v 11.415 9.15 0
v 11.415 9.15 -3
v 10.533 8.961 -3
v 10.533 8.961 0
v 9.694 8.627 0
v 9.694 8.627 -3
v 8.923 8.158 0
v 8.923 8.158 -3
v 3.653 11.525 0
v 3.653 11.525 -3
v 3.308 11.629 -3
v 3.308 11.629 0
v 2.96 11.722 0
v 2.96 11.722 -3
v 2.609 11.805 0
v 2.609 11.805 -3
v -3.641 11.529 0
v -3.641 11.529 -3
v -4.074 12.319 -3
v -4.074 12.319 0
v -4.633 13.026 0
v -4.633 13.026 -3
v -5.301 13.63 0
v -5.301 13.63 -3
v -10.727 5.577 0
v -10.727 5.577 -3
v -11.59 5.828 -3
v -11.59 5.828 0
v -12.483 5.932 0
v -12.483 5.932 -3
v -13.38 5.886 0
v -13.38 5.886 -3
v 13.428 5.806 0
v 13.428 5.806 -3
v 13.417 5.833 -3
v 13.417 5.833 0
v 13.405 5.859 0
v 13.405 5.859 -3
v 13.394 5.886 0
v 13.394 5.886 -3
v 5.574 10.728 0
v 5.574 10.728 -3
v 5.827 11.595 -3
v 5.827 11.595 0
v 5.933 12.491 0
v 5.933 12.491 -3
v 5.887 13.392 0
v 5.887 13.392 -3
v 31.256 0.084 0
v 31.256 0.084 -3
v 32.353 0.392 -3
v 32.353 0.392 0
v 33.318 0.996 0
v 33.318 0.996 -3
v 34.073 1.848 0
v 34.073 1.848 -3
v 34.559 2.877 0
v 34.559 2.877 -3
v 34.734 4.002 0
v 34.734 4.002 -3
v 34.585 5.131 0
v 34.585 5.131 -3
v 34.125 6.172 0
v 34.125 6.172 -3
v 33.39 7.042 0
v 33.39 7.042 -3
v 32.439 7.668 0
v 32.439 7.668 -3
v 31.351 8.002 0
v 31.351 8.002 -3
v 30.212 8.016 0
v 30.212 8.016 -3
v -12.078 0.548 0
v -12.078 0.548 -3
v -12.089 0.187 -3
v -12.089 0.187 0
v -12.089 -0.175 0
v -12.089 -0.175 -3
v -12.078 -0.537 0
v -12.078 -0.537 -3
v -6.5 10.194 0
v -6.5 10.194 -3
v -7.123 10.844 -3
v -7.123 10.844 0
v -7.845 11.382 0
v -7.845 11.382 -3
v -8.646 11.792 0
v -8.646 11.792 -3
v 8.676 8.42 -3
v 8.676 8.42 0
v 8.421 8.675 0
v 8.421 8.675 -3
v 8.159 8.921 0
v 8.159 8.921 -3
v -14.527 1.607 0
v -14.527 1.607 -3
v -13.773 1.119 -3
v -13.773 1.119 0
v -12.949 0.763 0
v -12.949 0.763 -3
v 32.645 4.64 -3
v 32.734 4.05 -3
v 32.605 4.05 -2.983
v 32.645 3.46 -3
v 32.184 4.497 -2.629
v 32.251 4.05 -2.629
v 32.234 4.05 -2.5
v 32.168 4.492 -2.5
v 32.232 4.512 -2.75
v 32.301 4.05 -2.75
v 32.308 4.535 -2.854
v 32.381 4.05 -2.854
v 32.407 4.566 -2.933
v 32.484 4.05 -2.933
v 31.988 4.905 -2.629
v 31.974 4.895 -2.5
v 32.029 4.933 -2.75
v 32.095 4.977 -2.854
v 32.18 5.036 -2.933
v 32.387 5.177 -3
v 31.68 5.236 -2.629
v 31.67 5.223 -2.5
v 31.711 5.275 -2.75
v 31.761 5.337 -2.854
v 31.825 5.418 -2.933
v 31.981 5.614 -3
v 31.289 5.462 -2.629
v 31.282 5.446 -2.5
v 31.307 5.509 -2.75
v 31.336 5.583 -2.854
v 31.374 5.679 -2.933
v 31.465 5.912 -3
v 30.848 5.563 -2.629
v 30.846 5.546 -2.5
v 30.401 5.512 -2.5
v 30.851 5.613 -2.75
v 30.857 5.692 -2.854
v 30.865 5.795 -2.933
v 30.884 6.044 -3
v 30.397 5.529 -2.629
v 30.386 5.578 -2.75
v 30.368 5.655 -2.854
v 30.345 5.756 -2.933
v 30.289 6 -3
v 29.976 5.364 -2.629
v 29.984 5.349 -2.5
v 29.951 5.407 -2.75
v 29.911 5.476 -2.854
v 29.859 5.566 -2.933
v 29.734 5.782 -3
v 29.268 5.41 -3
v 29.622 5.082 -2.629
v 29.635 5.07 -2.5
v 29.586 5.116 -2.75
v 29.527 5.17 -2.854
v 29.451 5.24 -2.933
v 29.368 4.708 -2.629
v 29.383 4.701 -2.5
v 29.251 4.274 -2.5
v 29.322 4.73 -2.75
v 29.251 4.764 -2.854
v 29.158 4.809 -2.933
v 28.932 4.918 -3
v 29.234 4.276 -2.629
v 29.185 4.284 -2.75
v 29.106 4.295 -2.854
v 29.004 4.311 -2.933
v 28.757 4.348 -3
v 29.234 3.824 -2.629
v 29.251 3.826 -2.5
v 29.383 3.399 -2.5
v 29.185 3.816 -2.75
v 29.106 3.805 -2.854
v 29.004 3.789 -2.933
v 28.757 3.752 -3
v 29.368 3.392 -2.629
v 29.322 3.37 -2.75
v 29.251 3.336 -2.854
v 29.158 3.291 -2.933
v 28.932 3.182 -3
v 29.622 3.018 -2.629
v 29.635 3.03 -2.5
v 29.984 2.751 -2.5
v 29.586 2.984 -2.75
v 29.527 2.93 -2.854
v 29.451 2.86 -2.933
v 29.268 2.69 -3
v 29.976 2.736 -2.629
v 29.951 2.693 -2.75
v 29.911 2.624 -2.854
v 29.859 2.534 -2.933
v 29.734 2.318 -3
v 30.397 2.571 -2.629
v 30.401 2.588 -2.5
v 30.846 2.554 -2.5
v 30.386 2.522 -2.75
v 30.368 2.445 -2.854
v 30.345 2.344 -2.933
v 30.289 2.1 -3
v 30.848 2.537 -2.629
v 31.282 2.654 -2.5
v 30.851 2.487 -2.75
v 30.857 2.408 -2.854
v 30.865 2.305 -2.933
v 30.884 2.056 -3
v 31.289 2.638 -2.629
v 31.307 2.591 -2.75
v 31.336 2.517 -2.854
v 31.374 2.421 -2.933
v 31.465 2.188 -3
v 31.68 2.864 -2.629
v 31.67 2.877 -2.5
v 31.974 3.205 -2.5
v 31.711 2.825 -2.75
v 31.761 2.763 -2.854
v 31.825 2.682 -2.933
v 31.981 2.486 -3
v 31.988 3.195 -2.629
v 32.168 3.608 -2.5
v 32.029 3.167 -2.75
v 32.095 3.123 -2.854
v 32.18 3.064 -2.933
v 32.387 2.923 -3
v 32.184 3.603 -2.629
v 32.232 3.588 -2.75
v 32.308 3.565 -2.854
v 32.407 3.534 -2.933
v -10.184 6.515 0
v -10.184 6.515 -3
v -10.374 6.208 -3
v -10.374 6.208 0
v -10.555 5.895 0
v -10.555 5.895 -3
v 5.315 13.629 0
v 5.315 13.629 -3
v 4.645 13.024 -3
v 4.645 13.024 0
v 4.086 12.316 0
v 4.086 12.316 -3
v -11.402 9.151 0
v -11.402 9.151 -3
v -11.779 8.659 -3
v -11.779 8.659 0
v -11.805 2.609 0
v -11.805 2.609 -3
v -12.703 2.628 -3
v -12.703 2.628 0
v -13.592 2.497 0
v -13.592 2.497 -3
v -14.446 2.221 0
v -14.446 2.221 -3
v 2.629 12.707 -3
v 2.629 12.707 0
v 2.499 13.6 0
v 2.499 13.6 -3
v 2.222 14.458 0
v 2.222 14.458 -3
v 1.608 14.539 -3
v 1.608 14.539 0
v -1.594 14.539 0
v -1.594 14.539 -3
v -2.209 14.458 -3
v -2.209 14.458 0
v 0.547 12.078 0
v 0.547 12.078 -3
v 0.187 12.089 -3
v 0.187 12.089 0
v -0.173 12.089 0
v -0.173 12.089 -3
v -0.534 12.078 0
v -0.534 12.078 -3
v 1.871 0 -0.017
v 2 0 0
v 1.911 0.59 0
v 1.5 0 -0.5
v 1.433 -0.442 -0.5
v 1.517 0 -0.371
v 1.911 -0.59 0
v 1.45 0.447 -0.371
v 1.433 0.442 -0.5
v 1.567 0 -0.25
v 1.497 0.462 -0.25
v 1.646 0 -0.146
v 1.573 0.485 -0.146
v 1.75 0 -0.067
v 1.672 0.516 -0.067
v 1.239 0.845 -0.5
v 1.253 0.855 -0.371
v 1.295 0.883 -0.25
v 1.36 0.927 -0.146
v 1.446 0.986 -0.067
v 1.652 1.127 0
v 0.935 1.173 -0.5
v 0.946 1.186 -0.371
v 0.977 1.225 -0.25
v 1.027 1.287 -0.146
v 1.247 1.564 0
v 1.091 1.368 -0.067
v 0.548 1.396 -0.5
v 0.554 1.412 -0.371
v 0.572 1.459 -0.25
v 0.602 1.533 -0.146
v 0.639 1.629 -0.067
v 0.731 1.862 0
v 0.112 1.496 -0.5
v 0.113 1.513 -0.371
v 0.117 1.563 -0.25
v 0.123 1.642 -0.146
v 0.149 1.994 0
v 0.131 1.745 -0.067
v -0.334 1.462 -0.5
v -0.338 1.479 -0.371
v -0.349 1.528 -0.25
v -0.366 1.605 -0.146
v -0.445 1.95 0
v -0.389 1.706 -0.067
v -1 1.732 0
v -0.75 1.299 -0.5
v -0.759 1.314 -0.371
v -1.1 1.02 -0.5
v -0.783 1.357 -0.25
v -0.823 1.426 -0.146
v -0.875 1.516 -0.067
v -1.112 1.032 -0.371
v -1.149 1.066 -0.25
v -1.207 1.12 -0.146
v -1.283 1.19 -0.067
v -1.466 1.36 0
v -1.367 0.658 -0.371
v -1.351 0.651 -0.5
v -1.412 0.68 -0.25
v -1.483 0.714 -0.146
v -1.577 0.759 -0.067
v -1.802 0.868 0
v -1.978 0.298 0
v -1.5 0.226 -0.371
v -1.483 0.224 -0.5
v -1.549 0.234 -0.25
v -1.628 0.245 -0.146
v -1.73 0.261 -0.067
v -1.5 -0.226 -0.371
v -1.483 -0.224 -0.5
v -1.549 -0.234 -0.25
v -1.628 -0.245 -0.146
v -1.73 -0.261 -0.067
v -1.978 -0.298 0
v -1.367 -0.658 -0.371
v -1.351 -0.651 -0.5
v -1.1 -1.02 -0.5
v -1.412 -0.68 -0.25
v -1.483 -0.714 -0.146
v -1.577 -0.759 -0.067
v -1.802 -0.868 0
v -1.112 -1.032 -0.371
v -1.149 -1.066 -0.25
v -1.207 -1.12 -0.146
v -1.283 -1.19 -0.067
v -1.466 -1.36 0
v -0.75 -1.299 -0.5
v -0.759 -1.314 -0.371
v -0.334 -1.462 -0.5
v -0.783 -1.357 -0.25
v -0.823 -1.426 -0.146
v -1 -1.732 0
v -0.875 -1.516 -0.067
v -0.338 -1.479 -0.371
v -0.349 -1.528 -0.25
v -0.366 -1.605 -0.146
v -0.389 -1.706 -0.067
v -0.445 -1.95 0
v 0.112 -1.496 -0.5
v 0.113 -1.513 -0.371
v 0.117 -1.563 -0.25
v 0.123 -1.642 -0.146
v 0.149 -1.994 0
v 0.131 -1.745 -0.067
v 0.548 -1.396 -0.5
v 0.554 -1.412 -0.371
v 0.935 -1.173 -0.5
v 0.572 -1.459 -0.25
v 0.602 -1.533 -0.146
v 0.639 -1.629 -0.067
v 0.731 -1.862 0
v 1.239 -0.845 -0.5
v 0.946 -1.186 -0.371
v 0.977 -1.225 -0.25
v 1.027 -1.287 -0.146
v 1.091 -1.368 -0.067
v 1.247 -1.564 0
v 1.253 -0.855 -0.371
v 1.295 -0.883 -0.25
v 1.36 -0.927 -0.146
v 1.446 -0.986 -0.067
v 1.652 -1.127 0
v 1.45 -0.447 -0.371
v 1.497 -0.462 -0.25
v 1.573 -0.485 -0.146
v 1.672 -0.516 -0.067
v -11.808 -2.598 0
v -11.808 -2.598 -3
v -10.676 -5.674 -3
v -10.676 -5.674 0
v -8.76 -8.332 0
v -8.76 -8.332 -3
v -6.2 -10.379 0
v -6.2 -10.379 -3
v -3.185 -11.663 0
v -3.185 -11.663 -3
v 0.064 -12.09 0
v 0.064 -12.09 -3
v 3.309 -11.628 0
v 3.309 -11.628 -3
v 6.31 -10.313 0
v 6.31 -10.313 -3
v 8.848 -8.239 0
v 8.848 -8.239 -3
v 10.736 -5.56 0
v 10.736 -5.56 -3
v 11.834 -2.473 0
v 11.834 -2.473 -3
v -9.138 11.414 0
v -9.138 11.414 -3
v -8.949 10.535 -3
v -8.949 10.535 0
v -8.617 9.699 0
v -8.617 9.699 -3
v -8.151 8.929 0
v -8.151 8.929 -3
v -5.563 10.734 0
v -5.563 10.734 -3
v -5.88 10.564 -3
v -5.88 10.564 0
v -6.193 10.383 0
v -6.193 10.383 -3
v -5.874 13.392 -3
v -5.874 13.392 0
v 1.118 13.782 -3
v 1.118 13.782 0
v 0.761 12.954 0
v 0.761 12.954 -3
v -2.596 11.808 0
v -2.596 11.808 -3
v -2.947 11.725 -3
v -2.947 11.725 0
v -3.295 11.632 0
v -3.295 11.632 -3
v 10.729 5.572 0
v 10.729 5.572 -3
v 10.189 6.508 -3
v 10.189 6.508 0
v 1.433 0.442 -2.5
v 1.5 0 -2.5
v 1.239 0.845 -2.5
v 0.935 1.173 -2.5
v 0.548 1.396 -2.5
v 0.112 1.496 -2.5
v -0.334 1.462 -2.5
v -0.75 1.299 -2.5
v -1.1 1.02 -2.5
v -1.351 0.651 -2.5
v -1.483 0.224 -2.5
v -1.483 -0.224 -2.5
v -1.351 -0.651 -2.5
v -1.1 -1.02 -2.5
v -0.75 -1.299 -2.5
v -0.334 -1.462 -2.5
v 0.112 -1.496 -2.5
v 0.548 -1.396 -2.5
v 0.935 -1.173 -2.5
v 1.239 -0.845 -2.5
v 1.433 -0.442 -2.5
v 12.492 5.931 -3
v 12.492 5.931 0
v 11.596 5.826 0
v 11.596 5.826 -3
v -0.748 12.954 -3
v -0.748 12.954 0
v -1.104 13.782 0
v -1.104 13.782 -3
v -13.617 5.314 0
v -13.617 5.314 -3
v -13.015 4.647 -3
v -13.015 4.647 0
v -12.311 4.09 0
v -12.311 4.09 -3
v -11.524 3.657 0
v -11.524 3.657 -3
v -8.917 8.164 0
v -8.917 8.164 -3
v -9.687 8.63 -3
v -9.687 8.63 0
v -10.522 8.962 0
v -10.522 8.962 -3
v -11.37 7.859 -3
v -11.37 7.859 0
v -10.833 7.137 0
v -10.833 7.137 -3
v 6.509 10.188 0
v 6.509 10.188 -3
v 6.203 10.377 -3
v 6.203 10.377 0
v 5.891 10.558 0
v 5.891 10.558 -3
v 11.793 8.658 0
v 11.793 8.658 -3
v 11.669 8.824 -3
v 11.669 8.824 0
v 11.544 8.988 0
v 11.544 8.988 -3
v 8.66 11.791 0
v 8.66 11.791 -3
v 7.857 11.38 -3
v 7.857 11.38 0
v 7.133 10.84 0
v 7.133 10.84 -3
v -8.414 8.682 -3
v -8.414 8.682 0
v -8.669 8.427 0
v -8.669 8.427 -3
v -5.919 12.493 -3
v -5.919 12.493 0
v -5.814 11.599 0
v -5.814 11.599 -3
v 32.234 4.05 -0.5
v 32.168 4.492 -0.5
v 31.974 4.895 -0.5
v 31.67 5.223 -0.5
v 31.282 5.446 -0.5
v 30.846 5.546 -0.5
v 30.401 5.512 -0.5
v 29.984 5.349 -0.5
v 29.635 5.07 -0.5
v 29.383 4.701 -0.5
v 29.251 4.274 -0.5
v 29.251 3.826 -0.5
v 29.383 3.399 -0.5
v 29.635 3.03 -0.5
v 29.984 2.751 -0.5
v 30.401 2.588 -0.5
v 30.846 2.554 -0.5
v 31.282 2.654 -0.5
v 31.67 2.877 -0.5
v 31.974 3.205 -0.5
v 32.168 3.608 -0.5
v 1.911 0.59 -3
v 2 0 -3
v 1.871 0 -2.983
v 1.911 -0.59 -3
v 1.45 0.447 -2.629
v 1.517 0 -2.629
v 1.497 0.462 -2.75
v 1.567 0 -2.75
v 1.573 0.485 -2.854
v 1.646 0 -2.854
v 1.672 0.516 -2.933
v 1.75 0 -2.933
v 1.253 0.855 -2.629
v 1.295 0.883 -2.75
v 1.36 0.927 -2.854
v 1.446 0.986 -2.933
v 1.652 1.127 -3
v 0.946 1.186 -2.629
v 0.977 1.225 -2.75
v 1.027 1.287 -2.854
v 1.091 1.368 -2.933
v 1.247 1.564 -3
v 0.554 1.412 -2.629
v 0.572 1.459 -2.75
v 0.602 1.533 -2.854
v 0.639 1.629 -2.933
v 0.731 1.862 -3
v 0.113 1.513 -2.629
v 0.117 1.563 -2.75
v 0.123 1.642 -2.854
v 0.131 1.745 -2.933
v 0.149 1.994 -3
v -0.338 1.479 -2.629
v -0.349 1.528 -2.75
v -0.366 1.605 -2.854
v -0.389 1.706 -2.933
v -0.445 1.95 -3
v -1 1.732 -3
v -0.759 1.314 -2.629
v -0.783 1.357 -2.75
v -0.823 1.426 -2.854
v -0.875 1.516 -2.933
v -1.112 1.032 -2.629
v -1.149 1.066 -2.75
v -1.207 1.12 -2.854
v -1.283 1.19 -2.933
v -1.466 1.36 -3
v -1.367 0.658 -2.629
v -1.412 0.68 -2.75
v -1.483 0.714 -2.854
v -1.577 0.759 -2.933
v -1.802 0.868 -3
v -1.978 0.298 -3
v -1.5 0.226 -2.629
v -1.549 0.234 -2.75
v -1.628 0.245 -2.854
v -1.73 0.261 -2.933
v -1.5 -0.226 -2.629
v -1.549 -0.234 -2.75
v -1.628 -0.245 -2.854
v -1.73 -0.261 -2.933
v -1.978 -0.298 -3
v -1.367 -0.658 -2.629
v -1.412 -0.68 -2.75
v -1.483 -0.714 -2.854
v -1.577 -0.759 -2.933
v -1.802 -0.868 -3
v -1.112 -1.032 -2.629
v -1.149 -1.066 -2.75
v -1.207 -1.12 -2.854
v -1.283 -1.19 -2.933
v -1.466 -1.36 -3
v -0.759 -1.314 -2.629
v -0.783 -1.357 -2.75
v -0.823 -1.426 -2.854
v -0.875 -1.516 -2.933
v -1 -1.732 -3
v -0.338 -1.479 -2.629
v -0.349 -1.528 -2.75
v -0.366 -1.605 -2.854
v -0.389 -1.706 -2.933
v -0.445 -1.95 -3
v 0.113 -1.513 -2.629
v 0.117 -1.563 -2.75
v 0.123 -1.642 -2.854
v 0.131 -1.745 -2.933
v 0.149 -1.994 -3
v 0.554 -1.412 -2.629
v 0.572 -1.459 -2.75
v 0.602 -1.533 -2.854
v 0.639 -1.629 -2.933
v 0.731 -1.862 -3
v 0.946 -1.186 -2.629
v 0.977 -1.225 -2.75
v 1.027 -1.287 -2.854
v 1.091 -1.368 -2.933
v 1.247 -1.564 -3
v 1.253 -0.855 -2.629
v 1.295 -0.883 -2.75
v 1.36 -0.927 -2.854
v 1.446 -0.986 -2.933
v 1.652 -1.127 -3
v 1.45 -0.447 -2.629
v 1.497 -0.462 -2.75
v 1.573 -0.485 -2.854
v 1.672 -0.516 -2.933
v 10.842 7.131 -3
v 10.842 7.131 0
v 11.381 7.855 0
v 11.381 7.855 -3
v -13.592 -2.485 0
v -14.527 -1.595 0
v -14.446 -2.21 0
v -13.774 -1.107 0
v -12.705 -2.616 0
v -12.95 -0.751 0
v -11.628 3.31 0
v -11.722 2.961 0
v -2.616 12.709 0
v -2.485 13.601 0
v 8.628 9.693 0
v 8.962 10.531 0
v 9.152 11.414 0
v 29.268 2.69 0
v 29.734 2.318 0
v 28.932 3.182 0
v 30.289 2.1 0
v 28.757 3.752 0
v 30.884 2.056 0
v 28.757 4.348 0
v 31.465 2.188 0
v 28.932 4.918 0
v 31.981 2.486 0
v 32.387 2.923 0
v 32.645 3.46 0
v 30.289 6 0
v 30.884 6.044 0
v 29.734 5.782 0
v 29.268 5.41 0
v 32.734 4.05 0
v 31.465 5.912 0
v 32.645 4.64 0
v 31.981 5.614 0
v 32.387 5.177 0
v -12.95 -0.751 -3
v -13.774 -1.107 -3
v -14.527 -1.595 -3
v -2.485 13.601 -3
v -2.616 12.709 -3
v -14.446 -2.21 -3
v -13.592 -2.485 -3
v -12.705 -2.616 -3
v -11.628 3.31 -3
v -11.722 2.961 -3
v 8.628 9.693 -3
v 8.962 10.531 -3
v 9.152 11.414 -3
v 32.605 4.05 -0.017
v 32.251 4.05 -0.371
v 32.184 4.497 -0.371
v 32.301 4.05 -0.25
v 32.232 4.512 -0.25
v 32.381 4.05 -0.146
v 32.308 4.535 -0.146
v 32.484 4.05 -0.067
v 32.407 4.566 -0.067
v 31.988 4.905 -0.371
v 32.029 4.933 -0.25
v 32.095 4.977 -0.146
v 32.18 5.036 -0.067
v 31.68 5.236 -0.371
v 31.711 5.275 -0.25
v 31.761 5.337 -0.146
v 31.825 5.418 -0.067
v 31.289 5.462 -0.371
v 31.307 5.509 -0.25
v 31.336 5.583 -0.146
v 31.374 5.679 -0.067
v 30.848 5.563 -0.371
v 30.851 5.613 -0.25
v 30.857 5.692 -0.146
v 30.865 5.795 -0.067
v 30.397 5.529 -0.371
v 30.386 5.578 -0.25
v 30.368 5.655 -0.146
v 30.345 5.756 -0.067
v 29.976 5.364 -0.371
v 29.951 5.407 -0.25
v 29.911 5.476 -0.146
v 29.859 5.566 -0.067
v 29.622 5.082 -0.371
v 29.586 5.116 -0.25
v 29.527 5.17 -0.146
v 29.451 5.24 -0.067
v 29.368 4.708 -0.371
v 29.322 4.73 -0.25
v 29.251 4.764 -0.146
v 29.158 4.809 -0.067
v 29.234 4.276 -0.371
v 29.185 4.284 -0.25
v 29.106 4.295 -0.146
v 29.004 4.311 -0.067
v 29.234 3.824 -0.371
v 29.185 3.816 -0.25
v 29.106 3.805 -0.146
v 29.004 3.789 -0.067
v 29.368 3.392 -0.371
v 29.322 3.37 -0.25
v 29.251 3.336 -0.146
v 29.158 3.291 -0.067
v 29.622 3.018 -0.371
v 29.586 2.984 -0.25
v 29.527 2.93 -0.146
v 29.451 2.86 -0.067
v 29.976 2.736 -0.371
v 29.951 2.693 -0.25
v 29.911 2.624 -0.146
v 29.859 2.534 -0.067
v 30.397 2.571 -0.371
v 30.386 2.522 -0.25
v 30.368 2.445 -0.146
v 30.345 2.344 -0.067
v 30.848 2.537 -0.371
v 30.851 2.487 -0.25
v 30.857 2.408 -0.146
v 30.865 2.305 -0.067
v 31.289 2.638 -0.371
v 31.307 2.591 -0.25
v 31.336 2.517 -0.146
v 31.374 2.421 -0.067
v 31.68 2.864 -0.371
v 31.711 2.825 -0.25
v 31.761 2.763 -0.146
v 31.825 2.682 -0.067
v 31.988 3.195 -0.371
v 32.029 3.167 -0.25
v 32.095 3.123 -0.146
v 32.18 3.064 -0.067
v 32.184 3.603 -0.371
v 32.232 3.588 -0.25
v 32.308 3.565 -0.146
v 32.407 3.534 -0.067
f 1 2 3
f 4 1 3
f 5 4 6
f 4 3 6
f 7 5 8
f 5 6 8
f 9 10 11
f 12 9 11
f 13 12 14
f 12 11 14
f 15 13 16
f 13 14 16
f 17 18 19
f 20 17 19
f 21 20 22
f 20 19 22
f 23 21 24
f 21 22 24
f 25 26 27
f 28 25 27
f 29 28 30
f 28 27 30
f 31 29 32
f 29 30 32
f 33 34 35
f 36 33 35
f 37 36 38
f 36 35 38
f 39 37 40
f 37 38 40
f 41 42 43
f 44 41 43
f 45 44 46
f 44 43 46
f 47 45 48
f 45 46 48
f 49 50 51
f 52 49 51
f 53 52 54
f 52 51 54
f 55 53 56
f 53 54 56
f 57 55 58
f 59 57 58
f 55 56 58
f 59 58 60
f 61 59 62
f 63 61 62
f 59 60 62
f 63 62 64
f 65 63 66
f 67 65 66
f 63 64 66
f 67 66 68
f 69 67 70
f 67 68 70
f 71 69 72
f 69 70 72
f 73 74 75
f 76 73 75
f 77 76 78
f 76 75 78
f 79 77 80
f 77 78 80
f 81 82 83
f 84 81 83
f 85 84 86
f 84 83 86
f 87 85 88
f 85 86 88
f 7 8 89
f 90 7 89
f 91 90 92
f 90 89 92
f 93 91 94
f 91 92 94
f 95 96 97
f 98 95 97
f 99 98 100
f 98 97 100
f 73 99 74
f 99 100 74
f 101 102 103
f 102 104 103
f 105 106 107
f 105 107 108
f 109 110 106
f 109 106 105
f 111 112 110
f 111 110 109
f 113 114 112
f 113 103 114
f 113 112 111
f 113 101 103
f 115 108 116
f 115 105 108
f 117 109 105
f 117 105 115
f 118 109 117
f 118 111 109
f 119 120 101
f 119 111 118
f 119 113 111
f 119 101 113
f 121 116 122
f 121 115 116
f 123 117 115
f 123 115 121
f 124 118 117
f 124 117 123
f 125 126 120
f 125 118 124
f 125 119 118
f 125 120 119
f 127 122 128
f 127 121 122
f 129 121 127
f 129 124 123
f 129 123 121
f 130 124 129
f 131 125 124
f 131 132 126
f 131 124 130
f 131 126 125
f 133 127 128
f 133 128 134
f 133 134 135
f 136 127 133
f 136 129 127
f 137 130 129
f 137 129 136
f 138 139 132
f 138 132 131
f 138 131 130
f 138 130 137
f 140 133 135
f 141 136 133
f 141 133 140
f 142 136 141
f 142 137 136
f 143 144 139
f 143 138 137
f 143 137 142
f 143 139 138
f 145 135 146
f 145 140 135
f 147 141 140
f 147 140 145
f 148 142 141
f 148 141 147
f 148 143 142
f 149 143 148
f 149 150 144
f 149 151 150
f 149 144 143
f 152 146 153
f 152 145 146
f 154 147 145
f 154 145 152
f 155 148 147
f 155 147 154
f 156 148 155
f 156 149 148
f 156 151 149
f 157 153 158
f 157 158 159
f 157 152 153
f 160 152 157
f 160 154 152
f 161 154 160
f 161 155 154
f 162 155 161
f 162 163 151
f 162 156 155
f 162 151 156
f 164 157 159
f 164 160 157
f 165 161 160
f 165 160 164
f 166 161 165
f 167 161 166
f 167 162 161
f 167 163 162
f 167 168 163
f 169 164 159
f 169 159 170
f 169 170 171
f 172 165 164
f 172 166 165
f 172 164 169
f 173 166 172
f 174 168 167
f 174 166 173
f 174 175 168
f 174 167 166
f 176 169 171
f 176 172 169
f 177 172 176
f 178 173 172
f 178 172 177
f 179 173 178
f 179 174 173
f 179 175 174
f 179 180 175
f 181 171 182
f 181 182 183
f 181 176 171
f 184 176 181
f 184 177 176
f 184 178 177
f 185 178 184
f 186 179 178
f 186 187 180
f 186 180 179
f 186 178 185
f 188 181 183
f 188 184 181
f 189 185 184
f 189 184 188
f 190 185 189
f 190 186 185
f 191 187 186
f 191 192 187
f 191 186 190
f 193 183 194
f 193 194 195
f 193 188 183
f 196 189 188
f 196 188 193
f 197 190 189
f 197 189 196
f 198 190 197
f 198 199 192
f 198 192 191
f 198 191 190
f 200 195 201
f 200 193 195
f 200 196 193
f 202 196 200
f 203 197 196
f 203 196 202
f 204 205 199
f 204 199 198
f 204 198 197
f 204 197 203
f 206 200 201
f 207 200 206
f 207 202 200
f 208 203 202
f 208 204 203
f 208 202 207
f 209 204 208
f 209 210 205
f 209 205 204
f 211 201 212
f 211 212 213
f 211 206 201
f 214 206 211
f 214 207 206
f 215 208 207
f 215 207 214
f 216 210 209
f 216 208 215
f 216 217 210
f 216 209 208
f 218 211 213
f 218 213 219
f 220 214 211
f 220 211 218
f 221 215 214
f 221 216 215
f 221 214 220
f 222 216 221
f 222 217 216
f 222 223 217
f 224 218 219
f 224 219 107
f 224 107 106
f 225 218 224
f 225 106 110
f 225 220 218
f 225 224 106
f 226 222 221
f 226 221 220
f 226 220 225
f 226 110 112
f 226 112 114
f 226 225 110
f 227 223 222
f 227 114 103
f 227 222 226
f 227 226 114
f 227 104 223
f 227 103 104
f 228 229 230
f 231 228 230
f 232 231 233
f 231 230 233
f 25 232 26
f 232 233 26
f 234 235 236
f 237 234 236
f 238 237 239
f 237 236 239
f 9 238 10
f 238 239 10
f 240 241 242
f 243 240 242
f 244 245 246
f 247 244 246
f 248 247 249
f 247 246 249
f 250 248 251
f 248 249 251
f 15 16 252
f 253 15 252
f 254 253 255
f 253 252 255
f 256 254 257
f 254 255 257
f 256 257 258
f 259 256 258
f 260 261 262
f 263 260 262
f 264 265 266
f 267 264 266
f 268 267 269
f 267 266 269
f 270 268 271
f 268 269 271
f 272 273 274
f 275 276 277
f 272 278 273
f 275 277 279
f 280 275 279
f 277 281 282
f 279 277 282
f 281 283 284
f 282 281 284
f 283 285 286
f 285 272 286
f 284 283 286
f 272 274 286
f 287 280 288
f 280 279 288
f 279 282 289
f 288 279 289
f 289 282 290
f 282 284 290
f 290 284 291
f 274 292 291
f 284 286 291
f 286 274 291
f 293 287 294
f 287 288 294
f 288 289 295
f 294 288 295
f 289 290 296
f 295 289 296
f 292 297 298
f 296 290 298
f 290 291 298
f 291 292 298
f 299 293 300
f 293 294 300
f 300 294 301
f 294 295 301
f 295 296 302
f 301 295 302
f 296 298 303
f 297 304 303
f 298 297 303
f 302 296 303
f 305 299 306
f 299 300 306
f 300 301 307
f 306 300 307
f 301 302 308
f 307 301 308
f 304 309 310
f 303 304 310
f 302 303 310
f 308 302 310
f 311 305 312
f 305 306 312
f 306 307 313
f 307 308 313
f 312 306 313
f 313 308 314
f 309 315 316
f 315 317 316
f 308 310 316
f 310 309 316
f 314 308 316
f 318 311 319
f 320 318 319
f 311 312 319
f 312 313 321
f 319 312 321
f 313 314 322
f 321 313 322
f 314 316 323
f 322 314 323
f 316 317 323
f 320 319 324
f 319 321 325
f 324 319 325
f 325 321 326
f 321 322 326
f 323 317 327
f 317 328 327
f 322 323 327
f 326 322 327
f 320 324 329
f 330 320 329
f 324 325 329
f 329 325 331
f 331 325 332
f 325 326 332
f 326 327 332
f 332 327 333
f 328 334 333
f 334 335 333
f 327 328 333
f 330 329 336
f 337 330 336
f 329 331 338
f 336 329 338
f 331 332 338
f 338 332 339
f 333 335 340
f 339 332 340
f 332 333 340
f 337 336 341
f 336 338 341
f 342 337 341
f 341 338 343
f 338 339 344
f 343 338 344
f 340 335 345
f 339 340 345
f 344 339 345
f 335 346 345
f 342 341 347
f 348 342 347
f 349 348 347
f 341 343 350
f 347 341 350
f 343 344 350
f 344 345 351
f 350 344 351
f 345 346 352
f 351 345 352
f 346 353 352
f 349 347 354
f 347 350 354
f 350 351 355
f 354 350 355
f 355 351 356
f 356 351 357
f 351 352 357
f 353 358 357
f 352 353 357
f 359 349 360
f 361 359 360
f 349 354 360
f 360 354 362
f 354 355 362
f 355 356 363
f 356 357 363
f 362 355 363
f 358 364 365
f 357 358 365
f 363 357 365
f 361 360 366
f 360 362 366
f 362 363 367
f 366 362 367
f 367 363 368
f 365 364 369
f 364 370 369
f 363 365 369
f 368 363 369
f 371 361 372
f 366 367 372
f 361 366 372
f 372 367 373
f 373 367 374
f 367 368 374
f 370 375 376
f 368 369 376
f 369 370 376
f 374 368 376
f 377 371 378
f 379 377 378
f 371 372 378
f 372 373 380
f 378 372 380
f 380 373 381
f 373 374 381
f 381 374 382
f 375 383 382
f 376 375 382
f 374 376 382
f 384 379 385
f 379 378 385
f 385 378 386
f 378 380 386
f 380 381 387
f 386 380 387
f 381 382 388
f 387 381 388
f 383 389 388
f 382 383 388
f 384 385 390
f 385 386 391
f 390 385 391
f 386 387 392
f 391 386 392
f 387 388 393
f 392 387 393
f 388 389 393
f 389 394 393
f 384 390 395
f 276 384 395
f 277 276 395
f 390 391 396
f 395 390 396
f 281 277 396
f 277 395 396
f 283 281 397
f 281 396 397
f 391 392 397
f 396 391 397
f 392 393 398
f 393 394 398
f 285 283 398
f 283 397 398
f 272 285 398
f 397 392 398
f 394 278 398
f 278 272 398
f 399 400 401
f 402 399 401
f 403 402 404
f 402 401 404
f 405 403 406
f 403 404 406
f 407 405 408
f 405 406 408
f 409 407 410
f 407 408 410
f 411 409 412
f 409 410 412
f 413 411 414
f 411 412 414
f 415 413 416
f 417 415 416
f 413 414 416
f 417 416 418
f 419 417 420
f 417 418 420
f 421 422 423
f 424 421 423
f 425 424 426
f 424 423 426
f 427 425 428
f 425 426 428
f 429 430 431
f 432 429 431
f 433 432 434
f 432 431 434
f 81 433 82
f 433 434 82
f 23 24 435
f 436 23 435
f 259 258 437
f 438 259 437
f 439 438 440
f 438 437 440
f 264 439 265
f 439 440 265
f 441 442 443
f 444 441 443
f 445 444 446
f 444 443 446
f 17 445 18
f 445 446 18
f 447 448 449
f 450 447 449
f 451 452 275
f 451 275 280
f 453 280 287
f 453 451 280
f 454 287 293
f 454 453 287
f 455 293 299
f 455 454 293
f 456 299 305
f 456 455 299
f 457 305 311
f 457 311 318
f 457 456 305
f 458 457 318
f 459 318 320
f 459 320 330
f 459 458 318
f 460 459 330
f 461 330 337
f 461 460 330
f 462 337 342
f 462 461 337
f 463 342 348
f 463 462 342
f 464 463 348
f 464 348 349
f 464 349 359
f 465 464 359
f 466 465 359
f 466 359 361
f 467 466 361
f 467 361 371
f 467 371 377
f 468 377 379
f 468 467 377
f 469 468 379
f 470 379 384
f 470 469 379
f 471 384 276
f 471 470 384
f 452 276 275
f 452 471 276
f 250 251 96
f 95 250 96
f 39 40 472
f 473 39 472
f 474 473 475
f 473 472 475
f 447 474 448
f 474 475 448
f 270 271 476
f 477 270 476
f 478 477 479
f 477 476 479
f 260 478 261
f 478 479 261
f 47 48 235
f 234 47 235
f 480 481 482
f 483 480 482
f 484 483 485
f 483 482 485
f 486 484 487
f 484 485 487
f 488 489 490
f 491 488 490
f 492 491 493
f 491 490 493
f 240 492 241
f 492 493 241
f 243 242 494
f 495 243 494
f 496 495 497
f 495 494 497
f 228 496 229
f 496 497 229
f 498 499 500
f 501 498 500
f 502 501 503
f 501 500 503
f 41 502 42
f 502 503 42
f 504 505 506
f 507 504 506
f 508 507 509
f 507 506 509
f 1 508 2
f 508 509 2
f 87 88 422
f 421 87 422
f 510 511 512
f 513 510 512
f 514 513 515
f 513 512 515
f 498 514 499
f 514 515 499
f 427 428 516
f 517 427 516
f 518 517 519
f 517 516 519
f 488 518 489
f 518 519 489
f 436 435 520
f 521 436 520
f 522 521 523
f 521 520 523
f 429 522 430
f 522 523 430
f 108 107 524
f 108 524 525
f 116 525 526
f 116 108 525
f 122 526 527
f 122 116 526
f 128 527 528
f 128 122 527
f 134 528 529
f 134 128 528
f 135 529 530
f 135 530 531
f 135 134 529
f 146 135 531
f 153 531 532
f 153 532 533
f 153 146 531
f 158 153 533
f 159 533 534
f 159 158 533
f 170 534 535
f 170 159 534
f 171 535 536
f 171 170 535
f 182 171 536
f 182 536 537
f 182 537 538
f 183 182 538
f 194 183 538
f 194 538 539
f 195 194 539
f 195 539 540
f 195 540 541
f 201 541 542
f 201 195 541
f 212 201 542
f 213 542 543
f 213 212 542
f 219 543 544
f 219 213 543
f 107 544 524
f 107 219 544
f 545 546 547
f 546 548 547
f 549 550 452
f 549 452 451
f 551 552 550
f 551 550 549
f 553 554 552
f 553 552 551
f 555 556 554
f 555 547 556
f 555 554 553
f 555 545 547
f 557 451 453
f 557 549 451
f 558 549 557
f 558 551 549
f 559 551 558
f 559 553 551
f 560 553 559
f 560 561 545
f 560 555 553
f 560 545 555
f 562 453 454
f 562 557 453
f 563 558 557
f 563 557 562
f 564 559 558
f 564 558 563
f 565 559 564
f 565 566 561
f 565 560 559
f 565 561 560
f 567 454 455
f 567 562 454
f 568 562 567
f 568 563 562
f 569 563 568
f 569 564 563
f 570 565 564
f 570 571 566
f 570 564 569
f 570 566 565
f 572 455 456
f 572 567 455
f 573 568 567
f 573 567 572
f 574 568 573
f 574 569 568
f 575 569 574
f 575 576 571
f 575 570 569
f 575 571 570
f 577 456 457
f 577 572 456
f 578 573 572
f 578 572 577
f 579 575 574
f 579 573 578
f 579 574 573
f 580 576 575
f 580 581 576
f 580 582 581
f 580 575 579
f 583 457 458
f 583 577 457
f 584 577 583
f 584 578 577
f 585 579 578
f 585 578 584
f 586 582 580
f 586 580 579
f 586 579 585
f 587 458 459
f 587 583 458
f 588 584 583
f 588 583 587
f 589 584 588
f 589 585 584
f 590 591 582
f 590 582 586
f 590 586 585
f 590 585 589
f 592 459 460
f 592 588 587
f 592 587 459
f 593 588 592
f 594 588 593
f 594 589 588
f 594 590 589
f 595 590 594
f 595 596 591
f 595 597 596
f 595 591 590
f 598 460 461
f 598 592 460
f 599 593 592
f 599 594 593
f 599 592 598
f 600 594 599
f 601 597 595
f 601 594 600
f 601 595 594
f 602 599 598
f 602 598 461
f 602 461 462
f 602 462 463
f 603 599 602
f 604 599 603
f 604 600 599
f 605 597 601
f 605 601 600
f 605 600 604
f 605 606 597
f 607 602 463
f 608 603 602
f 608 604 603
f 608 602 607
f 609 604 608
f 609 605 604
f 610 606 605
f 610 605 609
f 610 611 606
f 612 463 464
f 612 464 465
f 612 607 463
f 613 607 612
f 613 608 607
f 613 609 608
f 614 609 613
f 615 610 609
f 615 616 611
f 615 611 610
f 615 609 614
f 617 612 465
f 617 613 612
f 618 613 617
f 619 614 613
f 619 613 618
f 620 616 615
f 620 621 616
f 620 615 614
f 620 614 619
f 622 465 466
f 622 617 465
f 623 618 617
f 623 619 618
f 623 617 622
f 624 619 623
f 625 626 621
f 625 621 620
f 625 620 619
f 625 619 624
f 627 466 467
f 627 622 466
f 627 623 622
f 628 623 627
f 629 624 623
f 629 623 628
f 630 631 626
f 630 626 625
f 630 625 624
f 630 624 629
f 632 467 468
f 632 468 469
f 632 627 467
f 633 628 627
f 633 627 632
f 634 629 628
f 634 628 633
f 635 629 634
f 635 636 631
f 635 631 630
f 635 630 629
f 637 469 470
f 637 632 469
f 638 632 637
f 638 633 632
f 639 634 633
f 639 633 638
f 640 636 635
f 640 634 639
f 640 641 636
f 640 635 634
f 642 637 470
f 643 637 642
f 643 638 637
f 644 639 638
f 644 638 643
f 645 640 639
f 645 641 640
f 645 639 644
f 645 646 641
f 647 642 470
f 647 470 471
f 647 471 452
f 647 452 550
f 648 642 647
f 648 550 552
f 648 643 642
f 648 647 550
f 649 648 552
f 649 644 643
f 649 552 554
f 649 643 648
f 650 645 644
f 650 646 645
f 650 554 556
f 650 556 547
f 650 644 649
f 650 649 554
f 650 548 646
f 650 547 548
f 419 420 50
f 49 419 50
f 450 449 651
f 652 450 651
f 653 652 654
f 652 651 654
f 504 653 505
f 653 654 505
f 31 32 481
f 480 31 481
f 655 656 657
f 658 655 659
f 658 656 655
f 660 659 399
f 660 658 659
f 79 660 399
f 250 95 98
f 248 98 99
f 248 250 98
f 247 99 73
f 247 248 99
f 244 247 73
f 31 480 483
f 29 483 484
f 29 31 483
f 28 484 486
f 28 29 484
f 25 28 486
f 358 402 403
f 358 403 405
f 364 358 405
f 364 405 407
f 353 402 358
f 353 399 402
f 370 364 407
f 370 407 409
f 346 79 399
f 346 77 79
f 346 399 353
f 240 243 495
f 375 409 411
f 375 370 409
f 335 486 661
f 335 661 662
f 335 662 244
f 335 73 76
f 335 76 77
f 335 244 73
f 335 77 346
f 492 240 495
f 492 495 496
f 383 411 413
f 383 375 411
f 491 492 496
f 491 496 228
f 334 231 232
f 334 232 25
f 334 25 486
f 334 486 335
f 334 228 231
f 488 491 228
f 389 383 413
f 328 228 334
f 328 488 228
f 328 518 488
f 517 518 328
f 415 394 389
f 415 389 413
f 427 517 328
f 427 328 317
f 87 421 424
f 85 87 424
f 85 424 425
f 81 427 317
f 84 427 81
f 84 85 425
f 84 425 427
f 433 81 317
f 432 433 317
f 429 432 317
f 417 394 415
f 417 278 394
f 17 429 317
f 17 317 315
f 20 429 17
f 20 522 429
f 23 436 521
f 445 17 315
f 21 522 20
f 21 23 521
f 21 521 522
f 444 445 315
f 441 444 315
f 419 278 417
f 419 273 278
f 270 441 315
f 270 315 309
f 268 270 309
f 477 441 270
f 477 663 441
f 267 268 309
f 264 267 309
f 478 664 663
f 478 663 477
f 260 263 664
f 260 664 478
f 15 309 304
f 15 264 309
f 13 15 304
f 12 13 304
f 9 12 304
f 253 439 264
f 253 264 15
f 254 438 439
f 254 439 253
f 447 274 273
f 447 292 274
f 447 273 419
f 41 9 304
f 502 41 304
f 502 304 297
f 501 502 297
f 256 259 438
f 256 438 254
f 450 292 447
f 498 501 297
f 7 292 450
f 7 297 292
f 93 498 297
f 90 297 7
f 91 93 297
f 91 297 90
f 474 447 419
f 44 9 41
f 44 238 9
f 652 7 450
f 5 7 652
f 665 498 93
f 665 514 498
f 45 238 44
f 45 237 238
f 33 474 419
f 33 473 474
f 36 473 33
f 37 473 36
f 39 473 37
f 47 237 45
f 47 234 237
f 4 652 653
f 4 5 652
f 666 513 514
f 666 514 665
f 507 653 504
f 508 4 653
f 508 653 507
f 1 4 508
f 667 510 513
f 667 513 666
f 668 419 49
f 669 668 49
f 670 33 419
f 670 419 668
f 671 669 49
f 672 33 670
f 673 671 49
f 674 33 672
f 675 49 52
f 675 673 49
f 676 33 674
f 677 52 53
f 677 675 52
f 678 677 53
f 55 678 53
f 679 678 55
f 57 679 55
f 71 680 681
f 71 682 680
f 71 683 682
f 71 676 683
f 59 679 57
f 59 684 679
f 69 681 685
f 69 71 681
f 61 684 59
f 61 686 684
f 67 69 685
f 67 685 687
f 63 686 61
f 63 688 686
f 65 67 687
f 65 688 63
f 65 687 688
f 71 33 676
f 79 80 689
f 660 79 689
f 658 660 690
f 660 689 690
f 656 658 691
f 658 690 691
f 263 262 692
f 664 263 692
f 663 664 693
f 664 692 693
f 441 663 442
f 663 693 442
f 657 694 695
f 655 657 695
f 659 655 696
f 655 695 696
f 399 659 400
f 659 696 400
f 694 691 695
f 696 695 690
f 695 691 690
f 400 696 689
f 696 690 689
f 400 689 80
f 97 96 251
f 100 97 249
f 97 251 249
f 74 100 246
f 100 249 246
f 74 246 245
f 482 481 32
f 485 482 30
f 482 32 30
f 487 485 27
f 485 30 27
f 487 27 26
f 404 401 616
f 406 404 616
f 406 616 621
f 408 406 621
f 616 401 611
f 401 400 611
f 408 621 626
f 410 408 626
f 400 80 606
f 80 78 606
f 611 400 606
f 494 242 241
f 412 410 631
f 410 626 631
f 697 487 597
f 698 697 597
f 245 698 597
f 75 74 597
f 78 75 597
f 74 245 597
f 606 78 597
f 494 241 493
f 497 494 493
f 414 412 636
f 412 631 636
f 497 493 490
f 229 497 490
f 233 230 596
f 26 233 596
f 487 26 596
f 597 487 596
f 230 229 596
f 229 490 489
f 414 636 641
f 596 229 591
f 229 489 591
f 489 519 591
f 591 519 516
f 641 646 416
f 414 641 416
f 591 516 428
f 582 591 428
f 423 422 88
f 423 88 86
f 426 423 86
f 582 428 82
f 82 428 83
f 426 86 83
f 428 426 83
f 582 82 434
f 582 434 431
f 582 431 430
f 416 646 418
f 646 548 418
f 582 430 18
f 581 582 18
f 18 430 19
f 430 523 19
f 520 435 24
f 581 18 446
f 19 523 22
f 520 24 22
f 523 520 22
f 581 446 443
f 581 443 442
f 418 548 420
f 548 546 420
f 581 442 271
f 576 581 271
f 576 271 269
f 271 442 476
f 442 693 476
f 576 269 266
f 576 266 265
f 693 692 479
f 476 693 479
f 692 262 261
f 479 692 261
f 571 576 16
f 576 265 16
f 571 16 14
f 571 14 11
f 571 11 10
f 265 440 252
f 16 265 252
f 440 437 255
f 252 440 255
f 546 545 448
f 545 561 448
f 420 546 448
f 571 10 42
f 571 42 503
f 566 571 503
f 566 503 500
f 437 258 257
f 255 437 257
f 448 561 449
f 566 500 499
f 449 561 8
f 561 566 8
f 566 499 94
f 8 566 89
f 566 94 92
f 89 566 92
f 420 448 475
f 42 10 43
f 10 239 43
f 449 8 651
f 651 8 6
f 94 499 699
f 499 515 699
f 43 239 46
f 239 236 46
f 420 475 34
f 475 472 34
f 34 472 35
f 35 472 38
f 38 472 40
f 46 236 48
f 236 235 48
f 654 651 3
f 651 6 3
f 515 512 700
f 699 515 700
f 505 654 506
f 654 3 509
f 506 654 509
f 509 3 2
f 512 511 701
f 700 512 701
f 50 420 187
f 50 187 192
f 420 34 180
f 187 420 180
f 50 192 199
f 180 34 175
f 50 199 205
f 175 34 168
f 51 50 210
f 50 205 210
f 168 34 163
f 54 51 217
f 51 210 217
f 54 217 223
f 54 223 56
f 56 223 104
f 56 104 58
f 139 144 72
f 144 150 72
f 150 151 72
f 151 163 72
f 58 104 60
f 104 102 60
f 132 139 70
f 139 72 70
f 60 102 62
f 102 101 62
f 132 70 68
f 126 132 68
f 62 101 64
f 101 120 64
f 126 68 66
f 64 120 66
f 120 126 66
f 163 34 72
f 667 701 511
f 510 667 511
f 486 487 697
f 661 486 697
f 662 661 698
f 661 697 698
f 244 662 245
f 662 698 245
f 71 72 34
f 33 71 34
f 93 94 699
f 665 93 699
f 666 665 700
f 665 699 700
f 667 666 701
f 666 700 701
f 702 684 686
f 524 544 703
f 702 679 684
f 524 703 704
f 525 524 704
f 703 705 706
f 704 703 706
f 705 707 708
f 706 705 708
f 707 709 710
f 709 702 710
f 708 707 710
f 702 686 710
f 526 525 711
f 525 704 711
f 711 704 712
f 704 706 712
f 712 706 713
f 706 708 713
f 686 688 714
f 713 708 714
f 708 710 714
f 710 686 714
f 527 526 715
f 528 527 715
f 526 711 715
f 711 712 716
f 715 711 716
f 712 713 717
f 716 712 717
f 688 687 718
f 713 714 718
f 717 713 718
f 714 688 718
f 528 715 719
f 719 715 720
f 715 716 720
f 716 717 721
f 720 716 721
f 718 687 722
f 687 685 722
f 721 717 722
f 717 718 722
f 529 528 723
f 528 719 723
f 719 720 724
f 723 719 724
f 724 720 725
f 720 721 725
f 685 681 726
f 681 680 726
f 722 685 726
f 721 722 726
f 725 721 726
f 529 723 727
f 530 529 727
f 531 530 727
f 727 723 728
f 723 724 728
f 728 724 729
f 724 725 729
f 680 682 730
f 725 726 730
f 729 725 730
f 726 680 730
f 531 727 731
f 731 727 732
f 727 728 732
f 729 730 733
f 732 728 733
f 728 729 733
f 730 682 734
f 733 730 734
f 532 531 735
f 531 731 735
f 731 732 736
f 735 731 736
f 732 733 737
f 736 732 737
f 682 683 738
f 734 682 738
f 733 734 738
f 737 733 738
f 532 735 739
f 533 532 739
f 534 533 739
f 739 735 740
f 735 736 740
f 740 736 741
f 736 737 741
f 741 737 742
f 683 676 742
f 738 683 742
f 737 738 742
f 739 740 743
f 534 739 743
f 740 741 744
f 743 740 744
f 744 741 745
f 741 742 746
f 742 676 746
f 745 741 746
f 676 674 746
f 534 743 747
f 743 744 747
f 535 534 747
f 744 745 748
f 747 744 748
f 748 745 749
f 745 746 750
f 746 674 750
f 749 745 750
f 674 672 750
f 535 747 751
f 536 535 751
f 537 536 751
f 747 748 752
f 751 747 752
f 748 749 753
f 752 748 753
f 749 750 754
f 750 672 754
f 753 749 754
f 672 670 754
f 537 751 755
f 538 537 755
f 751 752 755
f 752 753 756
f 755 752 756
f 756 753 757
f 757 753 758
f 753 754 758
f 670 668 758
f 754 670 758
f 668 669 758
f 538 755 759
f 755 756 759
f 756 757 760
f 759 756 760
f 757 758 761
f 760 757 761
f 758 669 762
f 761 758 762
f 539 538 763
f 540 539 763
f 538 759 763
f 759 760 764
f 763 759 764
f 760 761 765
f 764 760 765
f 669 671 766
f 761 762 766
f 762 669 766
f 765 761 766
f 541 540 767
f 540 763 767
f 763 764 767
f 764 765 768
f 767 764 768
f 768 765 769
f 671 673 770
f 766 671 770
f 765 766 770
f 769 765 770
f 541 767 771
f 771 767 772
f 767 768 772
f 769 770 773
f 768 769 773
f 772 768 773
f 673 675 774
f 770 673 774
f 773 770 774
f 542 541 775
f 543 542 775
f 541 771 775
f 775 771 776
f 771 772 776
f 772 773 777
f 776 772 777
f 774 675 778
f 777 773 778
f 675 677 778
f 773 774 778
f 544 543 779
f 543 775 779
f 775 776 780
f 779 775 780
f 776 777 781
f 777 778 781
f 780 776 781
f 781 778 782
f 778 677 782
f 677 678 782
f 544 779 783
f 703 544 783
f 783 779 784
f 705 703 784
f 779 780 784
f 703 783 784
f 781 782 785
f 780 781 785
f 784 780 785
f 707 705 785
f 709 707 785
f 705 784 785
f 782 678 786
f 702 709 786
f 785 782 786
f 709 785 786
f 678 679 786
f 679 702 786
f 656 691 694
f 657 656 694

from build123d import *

# Parameters (mm, degrees)
BOSS_EXTRUDE1_START     = -3
BOSS_EXTRUDE1_OUTLINE_R = 1.5
BOSS_EXTRUDE1_DEPTH     = 3
FILLET1_R               = 0.5


# Read off the part's stored shape, not the designer's step: Boss-Extrude1
with BuildPart() as part:
    # Boss-Extrude1 outline → Boss-Extrude1 (new body)
    with BuildSketch(Plane.XY.offset(BOSS_EXTRUDE1_START)):
        with BuildLine():
            Line((11.834428484, -2.472731782), (31.256409707, 0.084220555))
            ThreePointArc((31.256409707, 0.084220555), (34.700084383, 4.572104769), (30.212200169, 8.015779445))
            Line((30.212200169, 8.015779445), (13.428337838, 5.806142051))
            ThreePointArc((13.428337838, 5.806142051), (13.411032377, 5.846003182), (13.39360859, 5.885812734))
            ThreePointArc((13.39360859, 5.885812734), (12.04167814, 5.897146383), (10.729304164, 5.572309592))
            Line((10.729304164, 5.572309592), (10.189200244, 6.507557022))
            ThreePointArc((10.189200244, 6.507557022), (11.126720661, 7.481723913), (11.792869471, 8.658240563))
            ThreePointArc((11.792869471, 8.658240563), (11.606759368, 8.906179706), (11.415437385, 9.150119633))
            ThreePointArc((11.415437385, 9.150119633), (10.106597569, 8.81117421), (8.922976471, 8.15773197))
            ThreePointArc((8.922976471, 8.15773197), (8.549706323, 8.548135574), (8.159371308, 8.921477448))
            ThreePointArc((8.159371308, 8.921477448), (8.812813548, 10.105098546), (9.151758972, 11.413938362))
            Line((9.151758972, 11.413938362), (8.659879901, 11.791370448))
            ThreePointArc((8.659879901, 11.791370448), (7.483516811, 11.125336137), (6.509436976, 10.187999326))
            ThreePointArc((6.509436976, 10.187999326), (6.047829045, 10.468613272), (5.574146563, 10.728326528))
            ThreePointArc((5.574146563, 10.728326528), (5.898805358, 12.040487702), (5.887415057, 13.392168338))
            Line((5.887415057, 13.392168338), (5.314609747, 13.629432066))
            ThreePointArc((5.314609747, 13.629432066), (4.351003751, 12.681995862), (3.65280527, 11.524977816))
            ThreePointArc((3.65280527, 11.524977816), (3.134170467, 11.676689406), (2.609274564, 11.805074597))
            ThreePointArc((2.609274564, 11.805074597), (2.58305967, 13.15599481), (2.222297371, 14.458117388))
            Line((2.222297371, 14.458117388), (1.607601557, 14.539043627))
            ThreePointArc((1.607601557, 14.539043627), (0.922327421, 13.375148622), (0.547316802, 12.077605074))
            ThreePointArc((0.547316802, 12.077605074), (0.006856042, 12.089998056), (-0.533618427, 12.078218055))
            ThreePointArc((-0.533618427, 12.078218055), (-0.908651119, 13.375486662), (-1.593822374, 14.539142845))
            Line((-1.593822374, 14.539142845), (-2.208518188, 14.458216606))
            ThreePointArc((-2.208518188, 14.458216606), (-2.569071942, 13.157522433), (-2.595800172, 11.808044777))
            ThreePointArc((-2.595800172, 11.808044777), (-3.121351418, 11.680122659), (-3.640655008, 11.528821757))
            ThreePointArc((-3.640655008, 11.528821757), (-4.338480819, 12.683812024), (-5.300881923, 13.629722958))
            Line((-5.300881923, 13.629722958), (-5.873687233, 13.39245923))
            ThreePointArc((-5.873687233, 13.39245923), (-5.885433032, 12.043808909), (-5.562611018, 10.734312212))
            ThreePointArc((-5.562611018, 10.734312212), (-6.037455135, 10.474599539), (-6.500199913, 10.193895285))
            ThreePointArc((-6.500199913, 10.193895285), (-7.47268922, 11.127885908), (-8.646251294, 11.791833189))
            Line((-8.646251294, 11.791833189), (-9.138130365, 11.414401103))
            ThreePointArc((-9.138130365, 11.414401103), (-8.80083054, 10.109699304), (-8.150983569, 8.92914144))
            ThreePointArc((-8.150983569, 8.92914144), (-8.542690029, 8.555147402), (-8.917254459, 8.163986338))
            ThreePointArc((-8.917254459, 8.163986338), (-10.097571821, 8.813551755), (-11.401949093, 9.15072269))
            Line((-11.401949093, 9.15072269), (-11.779381179, 8.658843619))
            ThreePointArc((-11.779381179, 8.658843619), (-11.116550367, 7.486781519), (-10.184349411, 6.515145975))
            ThreePointArc((-10.184349411, 6.515145975), (-10.46607819, 6.052215075), (-10.726778871, 5.577124264))
            ThreePointArc((-10.726778871, 5.577124264), (-12.034053776, 5.89841947), (-13.38017907, 5.886378776))
            Line((-13.38017907, 5.886378776), (-13.617442798, 5.313573465))
            ThreePointArc((-13.617442798, 5.313573465), (-12.674640857, 4.353631081), (-11.523783462, 3.656571444))
            ThreePointArc((-11.523783462, 3.656571444), (-11.67614775, 3.13618777), (-11.805025713, 2.60949572))
            ThreePointArc((-11.805025713, 2.60949572), (-13.149945407, 2.581153618), (-14.44612812, 2.221261089))
            Line((-14.44612812, 2.221261089), (-14.527054359, 1.606565275))
            ThreePointArc((-14.527054359, 1.606565275), (-13.368714152, 0.923687604), (-12.07756623, 0.548173302))
            ThreePointArc((-12.07756623, 0.548173302), (-12.089998597, 0.005825389), (-12.07808888, -0.536534252))
            ThreePointArc((-12.07808888, -0.536534252), (-13.369010177, -0.912066026), (-14.527153576, -1.594858655))
            Line((-14.527153576, -1.594858655), (-14.446227337, -2.20955447))
            ThreePointArc((-14.446227337, -2.20955447), (-13.151251636, -2.569269431), (-11.807551859, -2.598041398))
            ThreePointArc((-11.807551859, -2.598041398), (0.064079741, -12.08983018), (11.834428484, -2.472731782))
        make_face()
        Circle(BOSS_EXTRUDE1_OUTLINE_R, mode=Mode.SUBTRACT)
        with Locations((30.734304938, 4.05)):
            Circle(BOSS_EXTRUDE1_OUTLINE_R, mode=Mode.SUBTRACT)
    extrude(amount=BOSS_EXTRUDE1_DEPTH)

    # Fillet1
    fillet1_edges = [part.edges().sort_by_distance(p)[0] for p in [
        (29.234304938, 4.05, -3),
        (29.234304938, 4.05, 0),
        (-1.5, 0, 0),
        (-1.5, 0, -3),
    ]]
    fillet(fillet1_edges, radius=FILLET1_R)


solid = part.part
